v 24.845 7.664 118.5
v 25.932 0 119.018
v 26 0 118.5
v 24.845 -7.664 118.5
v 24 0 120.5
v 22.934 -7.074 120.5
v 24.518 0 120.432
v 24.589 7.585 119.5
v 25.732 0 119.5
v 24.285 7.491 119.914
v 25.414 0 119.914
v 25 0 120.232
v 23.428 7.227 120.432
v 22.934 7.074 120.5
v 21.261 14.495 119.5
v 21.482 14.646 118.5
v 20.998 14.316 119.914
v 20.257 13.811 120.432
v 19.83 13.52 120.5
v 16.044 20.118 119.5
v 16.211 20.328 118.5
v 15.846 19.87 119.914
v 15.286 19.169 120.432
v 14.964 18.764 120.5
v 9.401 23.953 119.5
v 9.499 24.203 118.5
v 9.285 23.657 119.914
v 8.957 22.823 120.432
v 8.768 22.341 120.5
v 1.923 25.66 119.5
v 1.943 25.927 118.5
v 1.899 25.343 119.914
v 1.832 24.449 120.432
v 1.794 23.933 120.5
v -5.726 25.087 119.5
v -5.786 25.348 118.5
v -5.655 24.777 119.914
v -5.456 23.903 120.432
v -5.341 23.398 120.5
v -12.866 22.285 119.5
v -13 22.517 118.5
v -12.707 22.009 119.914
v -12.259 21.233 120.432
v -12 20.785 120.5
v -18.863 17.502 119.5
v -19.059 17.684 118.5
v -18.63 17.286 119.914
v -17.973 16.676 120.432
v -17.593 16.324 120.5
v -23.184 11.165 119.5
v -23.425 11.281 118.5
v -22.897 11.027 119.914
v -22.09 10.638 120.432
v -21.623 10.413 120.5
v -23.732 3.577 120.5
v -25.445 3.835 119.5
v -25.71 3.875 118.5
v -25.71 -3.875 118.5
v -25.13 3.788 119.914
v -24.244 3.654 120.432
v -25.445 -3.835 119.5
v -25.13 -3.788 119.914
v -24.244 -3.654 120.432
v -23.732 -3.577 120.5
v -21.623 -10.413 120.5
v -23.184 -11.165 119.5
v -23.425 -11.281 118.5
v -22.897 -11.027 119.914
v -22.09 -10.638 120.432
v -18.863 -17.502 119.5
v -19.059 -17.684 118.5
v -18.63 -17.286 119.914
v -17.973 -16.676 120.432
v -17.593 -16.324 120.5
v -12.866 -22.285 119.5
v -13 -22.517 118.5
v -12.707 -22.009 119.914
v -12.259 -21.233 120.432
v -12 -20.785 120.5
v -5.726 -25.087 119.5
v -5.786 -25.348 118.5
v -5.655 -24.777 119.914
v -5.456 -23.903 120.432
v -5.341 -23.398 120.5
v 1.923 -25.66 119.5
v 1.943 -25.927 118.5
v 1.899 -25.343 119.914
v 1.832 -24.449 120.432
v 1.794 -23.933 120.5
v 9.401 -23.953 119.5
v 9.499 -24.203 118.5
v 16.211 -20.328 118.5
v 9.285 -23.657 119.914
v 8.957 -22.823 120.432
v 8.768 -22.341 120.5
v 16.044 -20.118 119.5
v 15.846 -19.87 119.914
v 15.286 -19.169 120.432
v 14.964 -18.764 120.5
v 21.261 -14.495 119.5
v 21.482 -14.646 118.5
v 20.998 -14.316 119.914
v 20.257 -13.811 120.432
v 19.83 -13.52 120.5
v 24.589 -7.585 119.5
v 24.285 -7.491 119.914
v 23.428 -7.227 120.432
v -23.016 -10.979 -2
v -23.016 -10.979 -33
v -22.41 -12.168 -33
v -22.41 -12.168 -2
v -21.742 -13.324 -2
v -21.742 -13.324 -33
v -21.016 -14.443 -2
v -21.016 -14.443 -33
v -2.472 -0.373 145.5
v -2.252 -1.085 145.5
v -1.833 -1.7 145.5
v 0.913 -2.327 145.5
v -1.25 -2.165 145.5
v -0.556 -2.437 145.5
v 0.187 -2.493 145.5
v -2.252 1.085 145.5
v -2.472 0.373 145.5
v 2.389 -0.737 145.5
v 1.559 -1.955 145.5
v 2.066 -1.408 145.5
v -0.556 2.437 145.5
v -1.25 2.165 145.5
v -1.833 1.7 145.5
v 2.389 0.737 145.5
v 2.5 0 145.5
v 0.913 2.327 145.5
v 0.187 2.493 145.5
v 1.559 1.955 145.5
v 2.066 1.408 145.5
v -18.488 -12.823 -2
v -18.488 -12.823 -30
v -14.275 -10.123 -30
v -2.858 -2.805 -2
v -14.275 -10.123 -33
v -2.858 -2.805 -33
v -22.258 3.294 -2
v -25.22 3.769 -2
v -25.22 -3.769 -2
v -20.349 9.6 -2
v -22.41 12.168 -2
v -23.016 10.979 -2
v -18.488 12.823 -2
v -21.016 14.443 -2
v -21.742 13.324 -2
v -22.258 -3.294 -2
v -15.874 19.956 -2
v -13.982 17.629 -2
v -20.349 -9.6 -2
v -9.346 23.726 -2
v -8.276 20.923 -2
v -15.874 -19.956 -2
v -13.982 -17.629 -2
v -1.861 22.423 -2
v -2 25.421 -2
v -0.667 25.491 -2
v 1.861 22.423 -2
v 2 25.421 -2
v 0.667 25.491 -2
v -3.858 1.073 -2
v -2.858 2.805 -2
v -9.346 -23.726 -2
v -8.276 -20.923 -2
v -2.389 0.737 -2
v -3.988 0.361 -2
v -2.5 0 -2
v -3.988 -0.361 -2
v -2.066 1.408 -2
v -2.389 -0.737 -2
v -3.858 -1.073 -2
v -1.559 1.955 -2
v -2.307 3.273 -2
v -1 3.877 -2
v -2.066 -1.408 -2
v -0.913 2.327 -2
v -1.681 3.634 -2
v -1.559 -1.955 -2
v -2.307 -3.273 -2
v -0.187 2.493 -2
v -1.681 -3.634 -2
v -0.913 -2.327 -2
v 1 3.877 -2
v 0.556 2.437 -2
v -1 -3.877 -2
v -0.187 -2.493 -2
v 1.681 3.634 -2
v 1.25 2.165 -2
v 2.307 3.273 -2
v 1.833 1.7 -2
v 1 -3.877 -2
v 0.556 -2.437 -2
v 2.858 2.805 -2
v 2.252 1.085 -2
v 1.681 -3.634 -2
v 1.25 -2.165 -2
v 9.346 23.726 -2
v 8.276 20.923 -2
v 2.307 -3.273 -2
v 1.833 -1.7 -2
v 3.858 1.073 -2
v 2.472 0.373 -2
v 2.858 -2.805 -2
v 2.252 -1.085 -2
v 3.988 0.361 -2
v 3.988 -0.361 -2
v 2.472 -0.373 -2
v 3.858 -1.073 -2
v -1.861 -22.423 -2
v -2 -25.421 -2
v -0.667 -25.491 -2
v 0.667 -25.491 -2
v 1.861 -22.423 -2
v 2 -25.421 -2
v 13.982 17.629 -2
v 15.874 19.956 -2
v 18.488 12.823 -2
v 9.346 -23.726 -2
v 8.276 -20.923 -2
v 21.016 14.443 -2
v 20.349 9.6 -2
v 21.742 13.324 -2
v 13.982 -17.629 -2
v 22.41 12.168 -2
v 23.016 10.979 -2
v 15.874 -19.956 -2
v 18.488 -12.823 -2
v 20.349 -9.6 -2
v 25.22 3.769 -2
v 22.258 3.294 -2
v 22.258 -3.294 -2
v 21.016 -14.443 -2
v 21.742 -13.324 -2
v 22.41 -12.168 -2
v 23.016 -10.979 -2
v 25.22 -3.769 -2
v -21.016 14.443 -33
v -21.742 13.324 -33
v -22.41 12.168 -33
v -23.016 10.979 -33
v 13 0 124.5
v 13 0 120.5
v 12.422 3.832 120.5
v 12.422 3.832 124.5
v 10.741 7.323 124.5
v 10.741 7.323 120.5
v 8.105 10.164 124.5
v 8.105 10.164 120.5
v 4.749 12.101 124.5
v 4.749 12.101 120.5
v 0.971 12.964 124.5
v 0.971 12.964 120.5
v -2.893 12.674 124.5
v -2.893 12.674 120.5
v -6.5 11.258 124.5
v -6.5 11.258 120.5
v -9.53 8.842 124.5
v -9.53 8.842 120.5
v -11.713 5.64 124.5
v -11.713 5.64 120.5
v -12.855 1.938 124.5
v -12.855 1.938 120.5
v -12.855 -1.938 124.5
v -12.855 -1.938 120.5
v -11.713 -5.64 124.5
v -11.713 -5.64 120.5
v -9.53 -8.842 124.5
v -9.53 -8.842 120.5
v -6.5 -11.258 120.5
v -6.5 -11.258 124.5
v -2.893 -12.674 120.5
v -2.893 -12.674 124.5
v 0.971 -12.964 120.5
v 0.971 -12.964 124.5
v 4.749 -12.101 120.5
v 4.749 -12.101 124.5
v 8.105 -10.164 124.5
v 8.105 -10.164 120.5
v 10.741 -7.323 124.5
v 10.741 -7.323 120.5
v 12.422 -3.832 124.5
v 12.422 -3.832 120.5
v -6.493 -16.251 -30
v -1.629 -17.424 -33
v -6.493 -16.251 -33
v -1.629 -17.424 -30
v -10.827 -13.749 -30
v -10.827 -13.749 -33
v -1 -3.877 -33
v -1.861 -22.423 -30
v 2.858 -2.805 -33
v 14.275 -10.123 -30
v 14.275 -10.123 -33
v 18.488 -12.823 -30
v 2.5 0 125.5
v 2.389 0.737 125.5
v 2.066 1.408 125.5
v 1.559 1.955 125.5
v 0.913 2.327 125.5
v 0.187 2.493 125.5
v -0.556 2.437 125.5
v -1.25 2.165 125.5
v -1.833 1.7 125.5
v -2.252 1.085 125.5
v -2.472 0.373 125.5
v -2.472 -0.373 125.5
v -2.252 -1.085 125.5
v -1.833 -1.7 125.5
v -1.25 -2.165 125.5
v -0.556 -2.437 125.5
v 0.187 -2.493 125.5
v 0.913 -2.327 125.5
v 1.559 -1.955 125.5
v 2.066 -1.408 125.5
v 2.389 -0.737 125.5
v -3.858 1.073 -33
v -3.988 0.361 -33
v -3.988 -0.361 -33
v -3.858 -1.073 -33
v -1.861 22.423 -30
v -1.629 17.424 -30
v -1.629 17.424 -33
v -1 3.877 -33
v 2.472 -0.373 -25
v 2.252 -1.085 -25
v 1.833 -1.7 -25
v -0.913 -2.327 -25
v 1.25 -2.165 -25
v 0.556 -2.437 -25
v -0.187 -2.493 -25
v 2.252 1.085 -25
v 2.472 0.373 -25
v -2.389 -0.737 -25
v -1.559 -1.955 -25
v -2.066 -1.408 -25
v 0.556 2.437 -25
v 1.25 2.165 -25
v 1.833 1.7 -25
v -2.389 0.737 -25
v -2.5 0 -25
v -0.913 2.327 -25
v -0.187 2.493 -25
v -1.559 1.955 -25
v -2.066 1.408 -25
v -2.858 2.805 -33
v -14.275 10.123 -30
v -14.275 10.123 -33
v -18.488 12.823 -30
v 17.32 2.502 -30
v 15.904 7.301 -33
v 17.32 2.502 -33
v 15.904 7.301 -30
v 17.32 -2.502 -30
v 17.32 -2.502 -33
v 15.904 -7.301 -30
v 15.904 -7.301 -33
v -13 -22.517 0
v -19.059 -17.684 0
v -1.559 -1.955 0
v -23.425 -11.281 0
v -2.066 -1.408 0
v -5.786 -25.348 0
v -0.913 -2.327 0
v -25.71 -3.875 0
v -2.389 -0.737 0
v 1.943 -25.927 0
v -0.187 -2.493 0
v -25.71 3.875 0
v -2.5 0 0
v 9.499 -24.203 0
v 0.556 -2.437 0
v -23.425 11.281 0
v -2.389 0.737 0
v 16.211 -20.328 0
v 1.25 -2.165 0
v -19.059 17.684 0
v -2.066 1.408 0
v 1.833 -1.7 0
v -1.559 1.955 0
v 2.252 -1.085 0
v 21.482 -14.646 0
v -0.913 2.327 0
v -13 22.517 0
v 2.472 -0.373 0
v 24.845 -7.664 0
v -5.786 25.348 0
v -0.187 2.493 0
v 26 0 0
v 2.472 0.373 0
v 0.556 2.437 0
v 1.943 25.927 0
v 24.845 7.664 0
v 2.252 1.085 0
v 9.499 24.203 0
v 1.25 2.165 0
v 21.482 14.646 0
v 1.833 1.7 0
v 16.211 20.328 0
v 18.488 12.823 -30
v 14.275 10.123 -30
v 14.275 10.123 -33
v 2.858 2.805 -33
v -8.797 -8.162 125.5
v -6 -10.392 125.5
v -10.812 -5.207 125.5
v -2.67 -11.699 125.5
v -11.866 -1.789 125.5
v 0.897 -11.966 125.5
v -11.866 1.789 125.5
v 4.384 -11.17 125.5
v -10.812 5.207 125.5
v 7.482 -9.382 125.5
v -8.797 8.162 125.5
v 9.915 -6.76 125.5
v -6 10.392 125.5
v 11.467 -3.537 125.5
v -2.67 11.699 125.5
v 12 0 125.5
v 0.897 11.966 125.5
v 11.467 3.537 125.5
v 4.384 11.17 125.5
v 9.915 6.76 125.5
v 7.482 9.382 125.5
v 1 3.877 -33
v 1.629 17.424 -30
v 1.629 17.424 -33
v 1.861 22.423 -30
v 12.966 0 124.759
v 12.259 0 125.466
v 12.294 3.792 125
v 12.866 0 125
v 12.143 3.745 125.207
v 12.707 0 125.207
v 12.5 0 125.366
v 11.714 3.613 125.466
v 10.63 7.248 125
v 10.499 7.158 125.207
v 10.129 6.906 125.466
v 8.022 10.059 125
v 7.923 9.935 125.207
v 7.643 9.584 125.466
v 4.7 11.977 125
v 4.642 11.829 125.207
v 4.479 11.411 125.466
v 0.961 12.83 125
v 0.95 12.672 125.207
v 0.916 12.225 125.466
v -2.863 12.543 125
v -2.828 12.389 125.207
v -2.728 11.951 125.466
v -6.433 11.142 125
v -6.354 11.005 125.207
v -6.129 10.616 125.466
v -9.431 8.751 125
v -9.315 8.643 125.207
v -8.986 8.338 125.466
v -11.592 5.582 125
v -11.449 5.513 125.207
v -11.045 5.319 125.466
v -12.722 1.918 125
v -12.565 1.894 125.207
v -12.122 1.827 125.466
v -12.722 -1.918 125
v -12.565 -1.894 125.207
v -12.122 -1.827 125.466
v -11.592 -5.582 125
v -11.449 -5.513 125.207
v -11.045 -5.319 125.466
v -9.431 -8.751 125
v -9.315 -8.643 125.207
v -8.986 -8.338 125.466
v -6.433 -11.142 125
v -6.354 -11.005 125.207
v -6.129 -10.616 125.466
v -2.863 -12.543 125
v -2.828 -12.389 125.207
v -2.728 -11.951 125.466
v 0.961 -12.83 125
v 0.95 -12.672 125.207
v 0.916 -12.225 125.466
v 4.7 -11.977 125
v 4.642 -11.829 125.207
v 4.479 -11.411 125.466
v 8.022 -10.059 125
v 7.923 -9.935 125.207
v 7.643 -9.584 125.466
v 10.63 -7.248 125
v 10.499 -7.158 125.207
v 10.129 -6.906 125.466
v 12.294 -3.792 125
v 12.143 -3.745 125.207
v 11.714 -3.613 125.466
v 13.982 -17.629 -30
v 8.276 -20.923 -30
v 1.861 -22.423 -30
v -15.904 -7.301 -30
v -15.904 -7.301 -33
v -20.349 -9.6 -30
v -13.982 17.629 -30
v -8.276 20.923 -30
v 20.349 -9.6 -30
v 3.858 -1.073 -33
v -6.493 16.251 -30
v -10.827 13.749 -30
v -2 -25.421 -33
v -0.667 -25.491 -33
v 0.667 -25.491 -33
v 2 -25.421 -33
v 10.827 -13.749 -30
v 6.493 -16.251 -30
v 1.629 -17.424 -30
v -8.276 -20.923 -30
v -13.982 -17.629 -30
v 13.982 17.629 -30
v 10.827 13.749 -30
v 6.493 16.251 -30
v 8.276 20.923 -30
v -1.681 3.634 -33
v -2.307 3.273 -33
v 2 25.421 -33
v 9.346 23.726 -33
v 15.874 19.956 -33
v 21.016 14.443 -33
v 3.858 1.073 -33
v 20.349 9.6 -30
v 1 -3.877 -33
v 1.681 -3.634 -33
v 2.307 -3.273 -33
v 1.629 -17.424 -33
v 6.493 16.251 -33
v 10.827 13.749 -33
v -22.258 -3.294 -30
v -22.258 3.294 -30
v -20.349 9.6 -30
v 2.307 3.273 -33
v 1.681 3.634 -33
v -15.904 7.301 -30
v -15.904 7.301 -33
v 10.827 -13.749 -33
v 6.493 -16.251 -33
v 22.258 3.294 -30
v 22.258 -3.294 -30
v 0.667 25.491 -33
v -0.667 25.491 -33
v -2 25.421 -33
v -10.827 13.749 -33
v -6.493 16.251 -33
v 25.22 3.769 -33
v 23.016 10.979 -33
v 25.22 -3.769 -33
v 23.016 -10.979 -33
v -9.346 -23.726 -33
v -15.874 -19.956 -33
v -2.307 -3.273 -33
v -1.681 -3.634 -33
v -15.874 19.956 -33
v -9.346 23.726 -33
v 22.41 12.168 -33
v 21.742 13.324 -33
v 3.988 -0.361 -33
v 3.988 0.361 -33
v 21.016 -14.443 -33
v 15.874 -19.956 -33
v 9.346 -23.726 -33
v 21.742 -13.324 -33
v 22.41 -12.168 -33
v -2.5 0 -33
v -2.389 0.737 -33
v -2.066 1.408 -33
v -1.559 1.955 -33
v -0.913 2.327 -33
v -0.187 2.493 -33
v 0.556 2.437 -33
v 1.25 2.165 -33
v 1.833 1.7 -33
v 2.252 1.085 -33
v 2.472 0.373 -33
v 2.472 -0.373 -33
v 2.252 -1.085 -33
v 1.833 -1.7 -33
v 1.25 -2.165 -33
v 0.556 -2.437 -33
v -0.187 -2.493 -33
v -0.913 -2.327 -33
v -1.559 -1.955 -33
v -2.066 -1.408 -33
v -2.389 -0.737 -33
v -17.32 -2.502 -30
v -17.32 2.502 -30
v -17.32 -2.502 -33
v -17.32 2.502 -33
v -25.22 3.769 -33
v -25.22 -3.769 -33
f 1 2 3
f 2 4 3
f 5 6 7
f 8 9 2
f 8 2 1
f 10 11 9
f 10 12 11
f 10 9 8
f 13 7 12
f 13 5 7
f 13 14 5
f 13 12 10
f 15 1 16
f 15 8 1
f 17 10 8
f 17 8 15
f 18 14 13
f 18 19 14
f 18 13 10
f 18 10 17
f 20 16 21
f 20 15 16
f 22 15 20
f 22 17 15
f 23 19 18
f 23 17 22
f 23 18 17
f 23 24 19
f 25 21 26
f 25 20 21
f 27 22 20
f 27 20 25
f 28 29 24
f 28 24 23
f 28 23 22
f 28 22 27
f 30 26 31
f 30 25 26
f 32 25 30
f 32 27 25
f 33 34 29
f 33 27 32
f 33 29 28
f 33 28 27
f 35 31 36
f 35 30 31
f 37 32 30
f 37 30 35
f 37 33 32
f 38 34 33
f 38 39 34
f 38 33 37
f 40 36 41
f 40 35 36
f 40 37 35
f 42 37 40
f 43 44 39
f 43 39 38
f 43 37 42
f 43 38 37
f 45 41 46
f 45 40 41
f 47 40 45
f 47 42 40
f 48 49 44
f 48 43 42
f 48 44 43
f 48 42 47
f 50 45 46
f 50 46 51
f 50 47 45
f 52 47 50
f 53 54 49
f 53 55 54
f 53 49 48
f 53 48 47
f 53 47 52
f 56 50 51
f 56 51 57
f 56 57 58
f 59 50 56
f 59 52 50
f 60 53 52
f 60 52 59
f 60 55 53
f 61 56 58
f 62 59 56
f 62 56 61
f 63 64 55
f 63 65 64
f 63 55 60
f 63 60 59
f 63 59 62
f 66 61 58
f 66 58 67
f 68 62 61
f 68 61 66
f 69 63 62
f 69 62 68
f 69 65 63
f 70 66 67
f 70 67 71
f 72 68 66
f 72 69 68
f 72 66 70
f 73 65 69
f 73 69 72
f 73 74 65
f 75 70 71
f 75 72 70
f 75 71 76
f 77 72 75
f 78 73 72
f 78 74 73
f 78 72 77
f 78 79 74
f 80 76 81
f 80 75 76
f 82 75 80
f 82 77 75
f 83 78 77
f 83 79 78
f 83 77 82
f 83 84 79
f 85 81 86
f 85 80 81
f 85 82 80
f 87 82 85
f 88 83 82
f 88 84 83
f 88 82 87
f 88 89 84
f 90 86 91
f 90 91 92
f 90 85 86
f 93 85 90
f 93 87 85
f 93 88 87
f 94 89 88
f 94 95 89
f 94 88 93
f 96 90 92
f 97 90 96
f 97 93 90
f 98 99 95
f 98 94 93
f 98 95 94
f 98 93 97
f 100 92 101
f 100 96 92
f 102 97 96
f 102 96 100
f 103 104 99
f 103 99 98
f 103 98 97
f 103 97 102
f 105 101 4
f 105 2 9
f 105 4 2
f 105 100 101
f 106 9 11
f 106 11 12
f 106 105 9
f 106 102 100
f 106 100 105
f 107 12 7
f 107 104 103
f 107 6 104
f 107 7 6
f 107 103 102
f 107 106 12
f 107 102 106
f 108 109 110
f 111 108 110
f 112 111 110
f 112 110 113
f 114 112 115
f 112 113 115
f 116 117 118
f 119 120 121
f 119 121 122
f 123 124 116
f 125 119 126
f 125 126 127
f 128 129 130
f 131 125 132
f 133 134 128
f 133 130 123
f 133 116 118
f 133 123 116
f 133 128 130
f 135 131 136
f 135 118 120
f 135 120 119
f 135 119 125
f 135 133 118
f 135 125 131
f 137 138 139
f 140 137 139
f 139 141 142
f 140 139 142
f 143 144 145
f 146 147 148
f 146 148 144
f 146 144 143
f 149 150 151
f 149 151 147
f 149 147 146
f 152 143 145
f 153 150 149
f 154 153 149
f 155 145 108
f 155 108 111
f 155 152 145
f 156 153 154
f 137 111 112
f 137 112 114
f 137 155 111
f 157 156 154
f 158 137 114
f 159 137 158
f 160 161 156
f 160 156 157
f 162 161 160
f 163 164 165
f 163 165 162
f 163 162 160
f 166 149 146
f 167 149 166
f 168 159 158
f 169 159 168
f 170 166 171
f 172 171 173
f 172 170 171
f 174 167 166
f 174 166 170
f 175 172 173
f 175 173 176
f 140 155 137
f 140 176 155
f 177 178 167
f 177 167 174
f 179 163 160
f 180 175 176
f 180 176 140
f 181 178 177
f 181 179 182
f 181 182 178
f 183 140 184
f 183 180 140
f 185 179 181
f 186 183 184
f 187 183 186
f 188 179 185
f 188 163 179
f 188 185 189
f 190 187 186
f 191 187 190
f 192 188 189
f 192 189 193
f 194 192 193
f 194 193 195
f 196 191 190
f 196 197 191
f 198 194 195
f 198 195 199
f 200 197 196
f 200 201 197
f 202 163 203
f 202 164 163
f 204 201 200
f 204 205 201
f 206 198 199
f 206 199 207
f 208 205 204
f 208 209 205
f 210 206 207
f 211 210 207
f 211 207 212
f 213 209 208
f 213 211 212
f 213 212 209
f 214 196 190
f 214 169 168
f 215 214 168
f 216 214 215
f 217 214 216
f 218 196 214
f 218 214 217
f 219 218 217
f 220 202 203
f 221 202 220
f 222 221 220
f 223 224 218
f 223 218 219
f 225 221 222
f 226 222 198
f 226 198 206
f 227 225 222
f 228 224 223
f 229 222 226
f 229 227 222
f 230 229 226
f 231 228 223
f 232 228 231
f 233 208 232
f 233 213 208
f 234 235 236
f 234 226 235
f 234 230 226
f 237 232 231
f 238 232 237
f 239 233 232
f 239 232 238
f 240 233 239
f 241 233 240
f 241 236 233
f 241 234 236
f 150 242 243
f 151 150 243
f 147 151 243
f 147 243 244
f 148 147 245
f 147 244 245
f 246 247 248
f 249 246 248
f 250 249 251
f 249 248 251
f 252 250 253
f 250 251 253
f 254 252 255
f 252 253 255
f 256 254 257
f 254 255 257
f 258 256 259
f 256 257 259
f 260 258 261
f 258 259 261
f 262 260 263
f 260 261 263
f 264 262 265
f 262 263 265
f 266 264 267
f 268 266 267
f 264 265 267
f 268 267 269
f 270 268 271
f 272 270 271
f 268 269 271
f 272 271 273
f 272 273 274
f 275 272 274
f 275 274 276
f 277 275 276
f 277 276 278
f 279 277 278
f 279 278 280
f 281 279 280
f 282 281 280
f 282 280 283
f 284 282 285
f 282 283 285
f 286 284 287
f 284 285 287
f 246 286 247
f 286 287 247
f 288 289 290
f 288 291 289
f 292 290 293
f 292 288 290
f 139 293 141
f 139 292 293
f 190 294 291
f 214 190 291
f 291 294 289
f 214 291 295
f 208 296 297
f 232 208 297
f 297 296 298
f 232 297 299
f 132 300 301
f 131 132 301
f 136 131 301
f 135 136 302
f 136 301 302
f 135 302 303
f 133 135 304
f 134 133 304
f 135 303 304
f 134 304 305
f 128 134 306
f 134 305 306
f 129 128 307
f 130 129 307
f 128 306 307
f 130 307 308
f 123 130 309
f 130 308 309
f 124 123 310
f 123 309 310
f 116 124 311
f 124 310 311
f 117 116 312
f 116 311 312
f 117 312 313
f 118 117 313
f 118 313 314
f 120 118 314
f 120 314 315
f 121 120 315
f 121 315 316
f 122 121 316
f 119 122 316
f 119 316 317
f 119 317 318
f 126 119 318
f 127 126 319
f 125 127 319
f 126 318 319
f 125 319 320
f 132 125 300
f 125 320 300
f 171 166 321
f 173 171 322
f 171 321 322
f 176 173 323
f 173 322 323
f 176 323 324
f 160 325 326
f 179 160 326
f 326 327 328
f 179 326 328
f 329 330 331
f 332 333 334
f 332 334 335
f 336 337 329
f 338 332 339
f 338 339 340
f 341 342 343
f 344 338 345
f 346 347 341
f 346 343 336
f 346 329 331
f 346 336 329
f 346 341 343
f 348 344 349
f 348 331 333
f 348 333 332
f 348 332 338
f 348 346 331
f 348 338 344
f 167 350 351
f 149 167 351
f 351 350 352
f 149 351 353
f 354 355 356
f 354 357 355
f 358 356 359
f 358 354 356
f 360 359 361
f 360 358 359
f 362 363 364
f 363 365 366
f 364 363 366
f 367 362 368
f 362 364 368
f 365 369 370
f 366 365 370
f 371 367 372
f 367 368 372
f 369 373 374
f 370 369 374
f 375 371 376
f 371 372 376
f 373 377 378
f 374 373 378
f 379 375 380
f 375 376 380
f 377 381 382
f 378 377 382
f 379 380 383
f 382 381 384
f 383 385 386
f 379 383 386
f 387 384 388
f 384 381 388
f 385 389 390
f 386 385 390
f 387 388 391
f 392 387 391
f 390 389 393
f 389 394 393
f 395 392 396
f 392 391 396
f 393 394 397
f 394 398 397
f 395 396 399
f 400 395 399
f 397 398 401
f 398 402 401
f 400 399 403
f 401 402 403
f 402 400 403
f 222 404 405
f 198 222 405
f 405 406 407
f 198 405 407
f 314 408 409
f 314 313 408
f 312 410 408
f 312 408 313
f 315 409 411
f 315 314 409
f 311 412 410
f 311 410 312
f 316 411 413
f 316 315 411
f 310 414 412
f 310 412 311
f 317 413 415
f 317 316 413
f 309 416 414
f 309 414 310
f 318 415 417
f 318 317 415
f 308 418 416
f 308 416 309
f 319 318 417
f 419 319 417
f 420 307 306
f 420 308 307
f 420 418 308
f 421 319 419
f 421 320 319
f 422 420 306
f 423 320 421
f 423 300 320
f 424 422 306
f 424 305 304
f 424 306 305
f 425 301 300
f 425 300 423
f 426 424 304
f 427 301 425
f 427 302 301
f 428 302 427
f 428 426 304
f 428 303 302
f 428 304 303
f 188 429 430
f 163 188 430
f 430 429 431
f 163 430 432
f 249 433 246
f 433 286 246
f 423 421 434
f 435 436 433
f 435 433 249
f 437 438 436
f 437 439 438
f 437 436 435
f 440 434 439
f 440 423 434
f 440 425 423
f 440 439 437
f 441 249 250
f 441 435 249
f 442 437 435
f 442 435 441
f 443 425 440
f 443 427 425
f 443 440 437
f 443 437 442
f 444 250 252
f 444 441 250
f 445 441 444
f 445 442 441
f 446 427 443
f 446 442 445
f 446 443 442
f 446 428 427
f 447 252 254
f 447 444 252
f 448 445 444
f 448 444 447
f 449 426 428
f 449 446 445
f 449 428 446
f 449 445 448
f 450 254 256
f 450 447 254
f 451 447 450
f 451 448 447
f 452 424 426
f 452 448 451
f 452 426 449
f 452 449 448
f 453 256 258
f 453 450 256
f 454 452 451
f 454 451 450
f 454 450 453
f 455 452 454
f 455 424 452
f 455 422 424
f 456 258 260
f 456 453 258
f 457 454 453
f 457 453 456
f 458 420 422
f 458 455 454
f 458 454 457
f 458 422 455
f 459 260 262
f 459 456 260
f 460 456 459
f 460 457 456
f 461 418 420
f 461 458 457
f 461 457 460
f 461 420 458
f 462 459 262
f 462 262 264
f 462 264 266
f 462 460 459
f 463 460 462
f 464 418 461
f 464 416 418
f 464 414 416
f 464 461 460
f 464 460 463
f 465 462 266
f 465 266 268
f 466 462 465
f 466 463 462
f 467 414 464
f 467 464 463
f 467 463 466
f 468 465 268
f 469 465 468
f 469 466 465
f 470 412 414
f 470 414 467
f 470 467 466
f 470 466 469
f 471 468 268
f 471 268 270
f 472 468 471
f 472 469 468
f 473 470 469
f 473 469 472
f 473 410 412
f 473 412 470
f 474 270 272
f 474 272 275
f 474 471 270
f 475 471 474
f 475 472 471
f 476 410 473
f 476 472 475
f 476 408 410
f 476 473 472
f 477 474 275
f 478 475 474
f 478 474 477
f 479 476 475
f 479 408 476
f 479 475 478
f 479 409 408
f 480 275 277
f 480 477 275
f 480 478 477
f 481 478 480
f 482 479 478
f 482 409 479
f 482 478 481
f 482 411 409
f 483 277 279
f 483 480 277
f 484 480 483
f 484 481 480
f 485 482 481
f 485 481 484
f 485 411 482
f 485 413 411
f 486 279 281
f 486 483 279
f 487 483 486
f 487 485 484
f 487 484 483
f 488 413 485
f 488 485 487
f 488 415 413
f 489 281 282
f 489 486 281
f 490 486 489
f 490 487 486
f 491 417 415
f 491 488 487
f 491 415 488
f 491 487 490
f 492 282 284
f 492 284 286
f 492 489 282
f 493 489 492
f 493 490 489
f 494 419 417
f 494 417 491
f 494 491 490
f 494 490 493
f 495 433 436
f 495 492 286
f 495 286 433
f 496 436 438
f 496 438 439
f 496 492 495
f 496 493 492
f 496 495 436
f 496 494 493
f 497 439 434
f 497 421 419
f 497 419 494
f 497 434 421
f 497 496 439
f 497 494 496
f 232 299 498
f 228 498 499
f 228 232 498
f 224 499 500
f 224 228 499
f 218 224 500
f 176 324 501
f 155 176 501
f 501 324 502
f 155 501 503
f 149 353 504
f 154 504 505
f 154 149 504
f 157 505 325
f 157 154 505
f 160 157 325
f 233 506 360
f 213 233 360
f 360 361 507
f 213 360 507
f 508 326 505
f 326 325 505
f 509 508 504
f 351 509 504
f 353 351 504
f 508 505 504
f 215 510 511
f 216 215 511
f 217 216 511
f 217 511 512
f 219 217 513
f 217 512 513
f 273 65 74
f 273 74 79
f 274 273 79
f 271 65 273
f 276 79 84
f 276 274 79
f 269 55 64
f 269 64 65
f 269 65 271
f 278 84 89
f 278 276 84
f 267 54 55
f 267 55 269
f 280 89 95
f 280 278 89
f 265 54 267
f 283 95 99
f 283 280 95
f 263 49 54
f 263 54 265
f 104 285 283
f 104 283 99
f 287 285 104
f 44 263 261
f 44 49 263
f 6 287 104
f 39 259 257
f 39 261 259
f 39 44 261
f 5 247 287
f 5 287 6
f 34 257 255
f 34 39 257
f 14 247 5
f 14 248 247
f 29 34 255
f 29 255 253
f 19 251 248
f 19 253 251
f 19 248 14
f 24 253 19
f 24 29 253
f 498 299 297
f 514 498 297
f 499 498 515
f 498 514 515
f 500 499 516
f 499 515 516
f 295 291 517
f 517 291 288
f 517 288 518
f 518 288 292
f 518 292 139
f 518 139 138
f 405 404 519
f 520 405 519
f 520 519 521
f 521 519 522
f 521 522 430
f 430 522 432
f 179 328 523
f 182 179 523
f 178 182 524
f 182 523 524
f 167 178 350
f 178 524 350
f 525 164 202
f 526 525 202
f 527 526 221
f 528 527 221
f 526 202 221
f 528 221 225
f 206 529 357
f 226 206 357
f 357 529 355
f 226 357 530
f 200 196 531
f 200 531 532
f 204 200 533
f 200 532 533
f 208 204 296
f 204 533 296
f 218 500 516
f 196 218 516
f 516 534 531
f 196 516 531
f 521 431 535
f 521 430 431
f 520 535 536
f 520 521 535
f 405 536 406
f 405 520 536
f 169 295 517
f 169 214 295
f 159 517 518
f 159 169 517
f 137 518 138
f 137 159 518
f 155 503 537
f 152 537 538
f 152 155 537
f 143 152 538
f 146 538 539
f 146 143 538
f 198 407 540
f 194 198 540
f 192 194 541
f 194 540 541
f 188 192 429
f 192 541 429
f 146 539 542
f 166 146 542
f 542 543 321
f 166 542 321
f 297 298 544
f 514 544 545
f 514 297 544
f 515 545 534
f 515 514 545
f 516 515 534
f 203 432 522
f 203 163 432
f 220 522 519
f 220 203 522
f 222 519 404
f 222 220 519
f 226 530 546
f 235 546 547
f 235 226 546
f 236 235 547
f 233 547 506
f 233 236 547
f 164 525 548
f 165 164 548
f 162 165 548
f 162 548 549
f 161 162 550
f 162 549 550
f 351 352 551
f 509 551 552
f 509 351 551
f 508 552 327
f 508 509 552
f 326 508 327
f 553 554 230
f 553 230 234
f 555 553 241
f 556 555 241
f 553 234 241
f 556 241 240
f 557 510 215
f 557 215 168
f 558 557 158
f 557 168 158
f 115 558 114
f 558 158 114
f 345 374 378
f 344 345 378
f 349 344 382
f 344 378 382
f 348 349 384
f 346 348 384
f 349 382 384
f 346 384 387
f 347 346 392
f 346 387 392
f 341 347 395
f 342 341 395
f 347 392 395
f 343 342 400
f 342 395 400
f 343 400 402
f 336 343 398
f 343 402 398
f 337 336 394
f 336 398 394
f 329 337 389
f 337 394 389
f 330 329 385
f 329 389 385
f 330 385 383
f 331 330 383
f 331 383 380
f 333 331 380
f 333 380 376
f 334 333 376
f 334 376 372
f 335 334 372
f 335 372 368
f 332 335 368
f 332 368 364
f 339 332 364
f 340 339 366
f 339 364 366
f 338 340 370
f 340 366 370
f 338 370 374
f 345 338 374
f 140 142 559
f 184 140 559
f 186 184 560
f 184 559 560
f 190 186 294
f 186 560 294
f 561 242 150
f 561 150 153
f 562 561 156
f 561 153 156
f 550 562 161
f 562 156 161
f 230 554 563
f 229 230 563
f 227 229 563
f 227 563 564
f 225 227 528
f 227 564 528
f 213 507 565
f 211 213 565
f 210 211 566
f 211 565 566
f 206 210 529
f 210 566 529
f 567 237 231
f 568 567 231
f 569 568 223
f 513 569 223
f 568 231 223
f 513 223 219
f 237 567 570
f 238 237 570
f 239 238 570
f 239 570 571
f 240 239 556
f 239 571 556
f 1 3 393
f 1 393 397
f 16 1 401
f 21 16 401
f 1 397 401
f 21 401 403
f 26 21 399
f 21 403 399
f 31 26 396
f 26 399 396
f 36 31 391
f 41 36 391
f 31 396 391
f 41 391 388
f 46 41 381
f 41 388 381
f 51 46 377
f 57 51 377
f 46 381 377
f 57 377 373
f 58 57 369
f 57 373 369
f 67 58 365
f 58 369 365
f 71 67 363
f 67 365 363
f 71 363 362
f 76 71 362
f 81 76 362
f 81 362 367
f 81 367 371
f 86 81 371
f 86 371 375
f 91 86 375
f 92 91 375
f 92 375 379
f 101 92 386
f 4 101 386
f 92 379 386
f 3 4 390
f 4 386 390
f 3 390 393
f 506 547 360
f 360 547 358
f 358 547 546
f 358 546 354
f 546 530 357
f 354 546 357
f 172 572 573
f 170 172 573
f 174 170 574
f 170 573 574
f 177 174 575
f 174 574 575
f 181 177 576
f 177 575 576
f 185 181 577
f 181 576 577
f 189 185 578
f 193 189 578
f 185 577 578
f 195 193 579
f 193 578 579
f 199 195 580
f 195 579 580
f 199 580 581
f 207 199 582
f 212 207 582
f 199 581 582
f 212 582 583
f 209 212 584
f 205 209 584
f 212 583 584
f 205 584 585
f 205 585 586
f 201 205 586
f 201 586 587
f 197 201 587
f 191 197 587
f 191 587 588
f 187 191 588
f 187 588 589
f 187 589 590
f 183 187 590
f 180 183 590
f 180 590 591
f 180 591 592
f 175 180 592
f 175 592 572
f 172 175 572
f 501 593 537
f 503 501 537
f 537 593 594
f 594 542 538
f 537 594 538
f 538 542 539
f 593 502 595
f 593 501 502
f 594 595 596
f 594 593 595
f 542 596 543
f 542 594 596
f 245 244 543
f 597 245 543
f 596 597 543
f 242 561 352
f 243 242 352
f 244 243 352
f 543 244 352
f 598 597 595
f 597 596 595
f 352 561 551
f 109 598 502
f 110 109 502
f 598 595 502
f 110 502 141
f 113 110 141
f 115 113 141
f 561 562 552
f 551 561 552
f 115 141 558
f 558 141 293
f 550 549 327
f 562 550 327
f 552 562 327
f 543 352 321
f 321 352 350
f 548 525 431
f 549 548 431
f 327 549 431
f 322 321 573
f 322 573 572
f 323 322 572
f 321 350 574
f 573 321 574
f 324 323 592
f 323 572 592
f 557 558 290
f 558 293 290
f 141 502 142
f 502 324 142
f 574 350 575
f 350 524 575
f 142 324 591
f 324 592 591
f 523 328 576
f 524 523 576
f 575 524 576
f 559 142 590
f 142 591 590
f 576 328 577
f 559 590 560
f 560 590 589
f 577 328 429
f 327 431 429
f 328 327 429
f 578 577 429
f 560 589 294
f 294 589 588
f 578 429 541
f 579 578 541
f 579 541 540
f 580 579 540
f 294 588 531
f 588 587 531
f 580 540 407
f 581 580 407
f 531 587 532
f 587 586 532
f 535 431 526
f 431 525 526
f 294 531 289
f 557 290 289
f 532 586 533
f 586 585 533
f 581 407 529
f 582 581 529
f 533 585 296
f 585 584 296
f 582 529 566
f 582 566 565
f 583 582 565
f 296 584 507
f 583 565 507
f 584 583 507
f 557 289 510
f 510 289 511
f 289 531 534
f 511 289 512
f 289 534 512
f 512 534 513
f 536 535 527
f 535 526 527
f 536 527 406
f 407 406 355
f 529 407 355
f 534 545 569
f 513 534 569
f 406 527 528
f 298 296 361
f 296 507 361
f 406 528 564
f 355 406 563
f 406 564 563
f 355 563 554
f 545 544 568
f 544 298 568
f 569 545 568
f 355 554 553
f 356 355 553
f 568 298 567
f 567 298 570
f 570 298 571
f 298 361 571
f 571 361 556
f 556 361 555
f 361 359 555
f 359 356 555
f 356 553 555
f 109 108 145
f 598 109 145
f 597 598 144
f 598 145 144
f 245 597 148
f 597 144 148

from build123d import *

# Parameters (mm, degrees)
SKETCH_1_R               = 26
EXTRUDE_1_DEPTH          = 120.5
SKETCH_2_R               = 13
EXTRUDE_2_DEPTH          = 5
SKETCH_3_R               = 2.5
EXTRUDE_3_DEPTH          = 20
SKETCH_7_R               = 2.5
EXTRUDE_7_DEPTH          = 25
FILLET_2_R               = 2
FILLET_3_R               = 1
SKETCH_4_R               = 25.5
SKETCH_4_R_2             = 22.5
EXTRUDE_4_DEPTH          = 28
SKETCH_5_R               = 25.5
SKETCH_5_R_2             = 17.5
EXTRUDE_5_DEPTH          = 3
SKETCH_6_R               = 2.5
EXTRUDE_6_DEPTH          = 31
PATTERN_CIRCULAR_1_COUNT = 6


with BuildPart() as part:
    # 草图1 → 凸台-拉伸1 (new body)
    with BuildSketch(Plane.XY):
        Circle(SKETCH_1_R)
    extrude(amount=EXTRUDE_1_DEPTH)

    # 草图2 → 凸台-拉伸2 (add)
    with BuildSketch(Plane.XY.offset(120.5)):
        Circle(SKETCH_2_R)
    extrude(amount=EXTRUDE_2_DEPTH)

    # 草图3 → 凸台-拉伸3 (add)
    with BuildSketch(Plane.XY.offset(125.5)):
        Circle(SKETCH_3_R)
    extrude(amount=EXTRUDE_3_DEPTH)

    # 草图7 → 凸台-拉伸7 (add)
    with BuildSketch(Plane(origin=(0, 0, 0), x_dir=(-1, 0, 0), z_dir=(0, 0, -1))):
        Circle(SKETCH_7_R)
    extrude(amount=EXTRUDE_7_DEPTH)

    # 圆角2
    fillet_2_edges = [part.edges().sort_by_distance(p)[0] for p in [
        (-26, 0, 120.5),
    ]]
    fillet(fillet_2_edges, radius=FILLET_2_R)

    # 圆角3
    fillet_3_edges = [part.edges().sort_by_distance(p)[0] for p in [
        (-13, 0, 125.5),
    ]]
    fillet(fillet_3_edges, radius=FILLET_3_R)


with BuildPart() as body_2:
    # 草图4 → 凸台-拉伸4 (new body)
    with BuildSketch(Plane(origin=(0, 0, -2), x_dir=(-1, 0, 0), z_dir=(0, 0, -1))):
        Circle(SKETCH_4_R)
        Circle(SKETCH_4_R_2, mode=Mode.SUBTRACT)
    extrude(amount=EXTRUDE_4_DEPTH)

    # 草图5 → 凸台-拉伸5 (add)
    with BuildSketch(Plane(origin=(0, 0, -30), x_dir=(-1, 0, 0), z_dir=(0, 0, -1))):
        Circle(SKETCH_5_R)
        Circle(SKETCH_5_R_2, mode=Mode.SUBTRACT)
    extrude(amount=EXTRUDE_5_DEPTH)

    # 草图6 → 凸台-拉伸6 (add)
    with BuildSketch(Plane(origin=(0, 0, -33), x_dir=(-1, 0, 0), z_dir=(0, 0, -1))):
        with BuildLine():
            Line((-1, 3.877336352), (-2, 25.421447638))
            ThreePointArc((-2, 25.421447638), (0, 25.5), (2, 25.421447638))
            Line((2, 25.421447638), (1, 3.877336352))
            ThreePointArc((1, 3.877336352), (0, -4.004214927), (-1, 3.877336352))
        make_face()
        Circle(SKETCH_6_R, mode=Mode.SUBTRACT)
    extrude_6 = extrude(amount=-EXTRUDE_6_DEPTH)

    # 阵列(圆周)1: 凸台-拉伸6 ×6 about axis
    pattern_circular_1_axis = Axis((0, 0, 0), (0, 0, 1))
    for i in range(1, PATTERN_CIRCULAR_1_COUNT):
        add(extrude_6.rotate(pattern_circular_1_axis, i * 360 / PATTERN_CIRCULAR_1_COUNT))


solid = Compound([part.part, body_2.part])
